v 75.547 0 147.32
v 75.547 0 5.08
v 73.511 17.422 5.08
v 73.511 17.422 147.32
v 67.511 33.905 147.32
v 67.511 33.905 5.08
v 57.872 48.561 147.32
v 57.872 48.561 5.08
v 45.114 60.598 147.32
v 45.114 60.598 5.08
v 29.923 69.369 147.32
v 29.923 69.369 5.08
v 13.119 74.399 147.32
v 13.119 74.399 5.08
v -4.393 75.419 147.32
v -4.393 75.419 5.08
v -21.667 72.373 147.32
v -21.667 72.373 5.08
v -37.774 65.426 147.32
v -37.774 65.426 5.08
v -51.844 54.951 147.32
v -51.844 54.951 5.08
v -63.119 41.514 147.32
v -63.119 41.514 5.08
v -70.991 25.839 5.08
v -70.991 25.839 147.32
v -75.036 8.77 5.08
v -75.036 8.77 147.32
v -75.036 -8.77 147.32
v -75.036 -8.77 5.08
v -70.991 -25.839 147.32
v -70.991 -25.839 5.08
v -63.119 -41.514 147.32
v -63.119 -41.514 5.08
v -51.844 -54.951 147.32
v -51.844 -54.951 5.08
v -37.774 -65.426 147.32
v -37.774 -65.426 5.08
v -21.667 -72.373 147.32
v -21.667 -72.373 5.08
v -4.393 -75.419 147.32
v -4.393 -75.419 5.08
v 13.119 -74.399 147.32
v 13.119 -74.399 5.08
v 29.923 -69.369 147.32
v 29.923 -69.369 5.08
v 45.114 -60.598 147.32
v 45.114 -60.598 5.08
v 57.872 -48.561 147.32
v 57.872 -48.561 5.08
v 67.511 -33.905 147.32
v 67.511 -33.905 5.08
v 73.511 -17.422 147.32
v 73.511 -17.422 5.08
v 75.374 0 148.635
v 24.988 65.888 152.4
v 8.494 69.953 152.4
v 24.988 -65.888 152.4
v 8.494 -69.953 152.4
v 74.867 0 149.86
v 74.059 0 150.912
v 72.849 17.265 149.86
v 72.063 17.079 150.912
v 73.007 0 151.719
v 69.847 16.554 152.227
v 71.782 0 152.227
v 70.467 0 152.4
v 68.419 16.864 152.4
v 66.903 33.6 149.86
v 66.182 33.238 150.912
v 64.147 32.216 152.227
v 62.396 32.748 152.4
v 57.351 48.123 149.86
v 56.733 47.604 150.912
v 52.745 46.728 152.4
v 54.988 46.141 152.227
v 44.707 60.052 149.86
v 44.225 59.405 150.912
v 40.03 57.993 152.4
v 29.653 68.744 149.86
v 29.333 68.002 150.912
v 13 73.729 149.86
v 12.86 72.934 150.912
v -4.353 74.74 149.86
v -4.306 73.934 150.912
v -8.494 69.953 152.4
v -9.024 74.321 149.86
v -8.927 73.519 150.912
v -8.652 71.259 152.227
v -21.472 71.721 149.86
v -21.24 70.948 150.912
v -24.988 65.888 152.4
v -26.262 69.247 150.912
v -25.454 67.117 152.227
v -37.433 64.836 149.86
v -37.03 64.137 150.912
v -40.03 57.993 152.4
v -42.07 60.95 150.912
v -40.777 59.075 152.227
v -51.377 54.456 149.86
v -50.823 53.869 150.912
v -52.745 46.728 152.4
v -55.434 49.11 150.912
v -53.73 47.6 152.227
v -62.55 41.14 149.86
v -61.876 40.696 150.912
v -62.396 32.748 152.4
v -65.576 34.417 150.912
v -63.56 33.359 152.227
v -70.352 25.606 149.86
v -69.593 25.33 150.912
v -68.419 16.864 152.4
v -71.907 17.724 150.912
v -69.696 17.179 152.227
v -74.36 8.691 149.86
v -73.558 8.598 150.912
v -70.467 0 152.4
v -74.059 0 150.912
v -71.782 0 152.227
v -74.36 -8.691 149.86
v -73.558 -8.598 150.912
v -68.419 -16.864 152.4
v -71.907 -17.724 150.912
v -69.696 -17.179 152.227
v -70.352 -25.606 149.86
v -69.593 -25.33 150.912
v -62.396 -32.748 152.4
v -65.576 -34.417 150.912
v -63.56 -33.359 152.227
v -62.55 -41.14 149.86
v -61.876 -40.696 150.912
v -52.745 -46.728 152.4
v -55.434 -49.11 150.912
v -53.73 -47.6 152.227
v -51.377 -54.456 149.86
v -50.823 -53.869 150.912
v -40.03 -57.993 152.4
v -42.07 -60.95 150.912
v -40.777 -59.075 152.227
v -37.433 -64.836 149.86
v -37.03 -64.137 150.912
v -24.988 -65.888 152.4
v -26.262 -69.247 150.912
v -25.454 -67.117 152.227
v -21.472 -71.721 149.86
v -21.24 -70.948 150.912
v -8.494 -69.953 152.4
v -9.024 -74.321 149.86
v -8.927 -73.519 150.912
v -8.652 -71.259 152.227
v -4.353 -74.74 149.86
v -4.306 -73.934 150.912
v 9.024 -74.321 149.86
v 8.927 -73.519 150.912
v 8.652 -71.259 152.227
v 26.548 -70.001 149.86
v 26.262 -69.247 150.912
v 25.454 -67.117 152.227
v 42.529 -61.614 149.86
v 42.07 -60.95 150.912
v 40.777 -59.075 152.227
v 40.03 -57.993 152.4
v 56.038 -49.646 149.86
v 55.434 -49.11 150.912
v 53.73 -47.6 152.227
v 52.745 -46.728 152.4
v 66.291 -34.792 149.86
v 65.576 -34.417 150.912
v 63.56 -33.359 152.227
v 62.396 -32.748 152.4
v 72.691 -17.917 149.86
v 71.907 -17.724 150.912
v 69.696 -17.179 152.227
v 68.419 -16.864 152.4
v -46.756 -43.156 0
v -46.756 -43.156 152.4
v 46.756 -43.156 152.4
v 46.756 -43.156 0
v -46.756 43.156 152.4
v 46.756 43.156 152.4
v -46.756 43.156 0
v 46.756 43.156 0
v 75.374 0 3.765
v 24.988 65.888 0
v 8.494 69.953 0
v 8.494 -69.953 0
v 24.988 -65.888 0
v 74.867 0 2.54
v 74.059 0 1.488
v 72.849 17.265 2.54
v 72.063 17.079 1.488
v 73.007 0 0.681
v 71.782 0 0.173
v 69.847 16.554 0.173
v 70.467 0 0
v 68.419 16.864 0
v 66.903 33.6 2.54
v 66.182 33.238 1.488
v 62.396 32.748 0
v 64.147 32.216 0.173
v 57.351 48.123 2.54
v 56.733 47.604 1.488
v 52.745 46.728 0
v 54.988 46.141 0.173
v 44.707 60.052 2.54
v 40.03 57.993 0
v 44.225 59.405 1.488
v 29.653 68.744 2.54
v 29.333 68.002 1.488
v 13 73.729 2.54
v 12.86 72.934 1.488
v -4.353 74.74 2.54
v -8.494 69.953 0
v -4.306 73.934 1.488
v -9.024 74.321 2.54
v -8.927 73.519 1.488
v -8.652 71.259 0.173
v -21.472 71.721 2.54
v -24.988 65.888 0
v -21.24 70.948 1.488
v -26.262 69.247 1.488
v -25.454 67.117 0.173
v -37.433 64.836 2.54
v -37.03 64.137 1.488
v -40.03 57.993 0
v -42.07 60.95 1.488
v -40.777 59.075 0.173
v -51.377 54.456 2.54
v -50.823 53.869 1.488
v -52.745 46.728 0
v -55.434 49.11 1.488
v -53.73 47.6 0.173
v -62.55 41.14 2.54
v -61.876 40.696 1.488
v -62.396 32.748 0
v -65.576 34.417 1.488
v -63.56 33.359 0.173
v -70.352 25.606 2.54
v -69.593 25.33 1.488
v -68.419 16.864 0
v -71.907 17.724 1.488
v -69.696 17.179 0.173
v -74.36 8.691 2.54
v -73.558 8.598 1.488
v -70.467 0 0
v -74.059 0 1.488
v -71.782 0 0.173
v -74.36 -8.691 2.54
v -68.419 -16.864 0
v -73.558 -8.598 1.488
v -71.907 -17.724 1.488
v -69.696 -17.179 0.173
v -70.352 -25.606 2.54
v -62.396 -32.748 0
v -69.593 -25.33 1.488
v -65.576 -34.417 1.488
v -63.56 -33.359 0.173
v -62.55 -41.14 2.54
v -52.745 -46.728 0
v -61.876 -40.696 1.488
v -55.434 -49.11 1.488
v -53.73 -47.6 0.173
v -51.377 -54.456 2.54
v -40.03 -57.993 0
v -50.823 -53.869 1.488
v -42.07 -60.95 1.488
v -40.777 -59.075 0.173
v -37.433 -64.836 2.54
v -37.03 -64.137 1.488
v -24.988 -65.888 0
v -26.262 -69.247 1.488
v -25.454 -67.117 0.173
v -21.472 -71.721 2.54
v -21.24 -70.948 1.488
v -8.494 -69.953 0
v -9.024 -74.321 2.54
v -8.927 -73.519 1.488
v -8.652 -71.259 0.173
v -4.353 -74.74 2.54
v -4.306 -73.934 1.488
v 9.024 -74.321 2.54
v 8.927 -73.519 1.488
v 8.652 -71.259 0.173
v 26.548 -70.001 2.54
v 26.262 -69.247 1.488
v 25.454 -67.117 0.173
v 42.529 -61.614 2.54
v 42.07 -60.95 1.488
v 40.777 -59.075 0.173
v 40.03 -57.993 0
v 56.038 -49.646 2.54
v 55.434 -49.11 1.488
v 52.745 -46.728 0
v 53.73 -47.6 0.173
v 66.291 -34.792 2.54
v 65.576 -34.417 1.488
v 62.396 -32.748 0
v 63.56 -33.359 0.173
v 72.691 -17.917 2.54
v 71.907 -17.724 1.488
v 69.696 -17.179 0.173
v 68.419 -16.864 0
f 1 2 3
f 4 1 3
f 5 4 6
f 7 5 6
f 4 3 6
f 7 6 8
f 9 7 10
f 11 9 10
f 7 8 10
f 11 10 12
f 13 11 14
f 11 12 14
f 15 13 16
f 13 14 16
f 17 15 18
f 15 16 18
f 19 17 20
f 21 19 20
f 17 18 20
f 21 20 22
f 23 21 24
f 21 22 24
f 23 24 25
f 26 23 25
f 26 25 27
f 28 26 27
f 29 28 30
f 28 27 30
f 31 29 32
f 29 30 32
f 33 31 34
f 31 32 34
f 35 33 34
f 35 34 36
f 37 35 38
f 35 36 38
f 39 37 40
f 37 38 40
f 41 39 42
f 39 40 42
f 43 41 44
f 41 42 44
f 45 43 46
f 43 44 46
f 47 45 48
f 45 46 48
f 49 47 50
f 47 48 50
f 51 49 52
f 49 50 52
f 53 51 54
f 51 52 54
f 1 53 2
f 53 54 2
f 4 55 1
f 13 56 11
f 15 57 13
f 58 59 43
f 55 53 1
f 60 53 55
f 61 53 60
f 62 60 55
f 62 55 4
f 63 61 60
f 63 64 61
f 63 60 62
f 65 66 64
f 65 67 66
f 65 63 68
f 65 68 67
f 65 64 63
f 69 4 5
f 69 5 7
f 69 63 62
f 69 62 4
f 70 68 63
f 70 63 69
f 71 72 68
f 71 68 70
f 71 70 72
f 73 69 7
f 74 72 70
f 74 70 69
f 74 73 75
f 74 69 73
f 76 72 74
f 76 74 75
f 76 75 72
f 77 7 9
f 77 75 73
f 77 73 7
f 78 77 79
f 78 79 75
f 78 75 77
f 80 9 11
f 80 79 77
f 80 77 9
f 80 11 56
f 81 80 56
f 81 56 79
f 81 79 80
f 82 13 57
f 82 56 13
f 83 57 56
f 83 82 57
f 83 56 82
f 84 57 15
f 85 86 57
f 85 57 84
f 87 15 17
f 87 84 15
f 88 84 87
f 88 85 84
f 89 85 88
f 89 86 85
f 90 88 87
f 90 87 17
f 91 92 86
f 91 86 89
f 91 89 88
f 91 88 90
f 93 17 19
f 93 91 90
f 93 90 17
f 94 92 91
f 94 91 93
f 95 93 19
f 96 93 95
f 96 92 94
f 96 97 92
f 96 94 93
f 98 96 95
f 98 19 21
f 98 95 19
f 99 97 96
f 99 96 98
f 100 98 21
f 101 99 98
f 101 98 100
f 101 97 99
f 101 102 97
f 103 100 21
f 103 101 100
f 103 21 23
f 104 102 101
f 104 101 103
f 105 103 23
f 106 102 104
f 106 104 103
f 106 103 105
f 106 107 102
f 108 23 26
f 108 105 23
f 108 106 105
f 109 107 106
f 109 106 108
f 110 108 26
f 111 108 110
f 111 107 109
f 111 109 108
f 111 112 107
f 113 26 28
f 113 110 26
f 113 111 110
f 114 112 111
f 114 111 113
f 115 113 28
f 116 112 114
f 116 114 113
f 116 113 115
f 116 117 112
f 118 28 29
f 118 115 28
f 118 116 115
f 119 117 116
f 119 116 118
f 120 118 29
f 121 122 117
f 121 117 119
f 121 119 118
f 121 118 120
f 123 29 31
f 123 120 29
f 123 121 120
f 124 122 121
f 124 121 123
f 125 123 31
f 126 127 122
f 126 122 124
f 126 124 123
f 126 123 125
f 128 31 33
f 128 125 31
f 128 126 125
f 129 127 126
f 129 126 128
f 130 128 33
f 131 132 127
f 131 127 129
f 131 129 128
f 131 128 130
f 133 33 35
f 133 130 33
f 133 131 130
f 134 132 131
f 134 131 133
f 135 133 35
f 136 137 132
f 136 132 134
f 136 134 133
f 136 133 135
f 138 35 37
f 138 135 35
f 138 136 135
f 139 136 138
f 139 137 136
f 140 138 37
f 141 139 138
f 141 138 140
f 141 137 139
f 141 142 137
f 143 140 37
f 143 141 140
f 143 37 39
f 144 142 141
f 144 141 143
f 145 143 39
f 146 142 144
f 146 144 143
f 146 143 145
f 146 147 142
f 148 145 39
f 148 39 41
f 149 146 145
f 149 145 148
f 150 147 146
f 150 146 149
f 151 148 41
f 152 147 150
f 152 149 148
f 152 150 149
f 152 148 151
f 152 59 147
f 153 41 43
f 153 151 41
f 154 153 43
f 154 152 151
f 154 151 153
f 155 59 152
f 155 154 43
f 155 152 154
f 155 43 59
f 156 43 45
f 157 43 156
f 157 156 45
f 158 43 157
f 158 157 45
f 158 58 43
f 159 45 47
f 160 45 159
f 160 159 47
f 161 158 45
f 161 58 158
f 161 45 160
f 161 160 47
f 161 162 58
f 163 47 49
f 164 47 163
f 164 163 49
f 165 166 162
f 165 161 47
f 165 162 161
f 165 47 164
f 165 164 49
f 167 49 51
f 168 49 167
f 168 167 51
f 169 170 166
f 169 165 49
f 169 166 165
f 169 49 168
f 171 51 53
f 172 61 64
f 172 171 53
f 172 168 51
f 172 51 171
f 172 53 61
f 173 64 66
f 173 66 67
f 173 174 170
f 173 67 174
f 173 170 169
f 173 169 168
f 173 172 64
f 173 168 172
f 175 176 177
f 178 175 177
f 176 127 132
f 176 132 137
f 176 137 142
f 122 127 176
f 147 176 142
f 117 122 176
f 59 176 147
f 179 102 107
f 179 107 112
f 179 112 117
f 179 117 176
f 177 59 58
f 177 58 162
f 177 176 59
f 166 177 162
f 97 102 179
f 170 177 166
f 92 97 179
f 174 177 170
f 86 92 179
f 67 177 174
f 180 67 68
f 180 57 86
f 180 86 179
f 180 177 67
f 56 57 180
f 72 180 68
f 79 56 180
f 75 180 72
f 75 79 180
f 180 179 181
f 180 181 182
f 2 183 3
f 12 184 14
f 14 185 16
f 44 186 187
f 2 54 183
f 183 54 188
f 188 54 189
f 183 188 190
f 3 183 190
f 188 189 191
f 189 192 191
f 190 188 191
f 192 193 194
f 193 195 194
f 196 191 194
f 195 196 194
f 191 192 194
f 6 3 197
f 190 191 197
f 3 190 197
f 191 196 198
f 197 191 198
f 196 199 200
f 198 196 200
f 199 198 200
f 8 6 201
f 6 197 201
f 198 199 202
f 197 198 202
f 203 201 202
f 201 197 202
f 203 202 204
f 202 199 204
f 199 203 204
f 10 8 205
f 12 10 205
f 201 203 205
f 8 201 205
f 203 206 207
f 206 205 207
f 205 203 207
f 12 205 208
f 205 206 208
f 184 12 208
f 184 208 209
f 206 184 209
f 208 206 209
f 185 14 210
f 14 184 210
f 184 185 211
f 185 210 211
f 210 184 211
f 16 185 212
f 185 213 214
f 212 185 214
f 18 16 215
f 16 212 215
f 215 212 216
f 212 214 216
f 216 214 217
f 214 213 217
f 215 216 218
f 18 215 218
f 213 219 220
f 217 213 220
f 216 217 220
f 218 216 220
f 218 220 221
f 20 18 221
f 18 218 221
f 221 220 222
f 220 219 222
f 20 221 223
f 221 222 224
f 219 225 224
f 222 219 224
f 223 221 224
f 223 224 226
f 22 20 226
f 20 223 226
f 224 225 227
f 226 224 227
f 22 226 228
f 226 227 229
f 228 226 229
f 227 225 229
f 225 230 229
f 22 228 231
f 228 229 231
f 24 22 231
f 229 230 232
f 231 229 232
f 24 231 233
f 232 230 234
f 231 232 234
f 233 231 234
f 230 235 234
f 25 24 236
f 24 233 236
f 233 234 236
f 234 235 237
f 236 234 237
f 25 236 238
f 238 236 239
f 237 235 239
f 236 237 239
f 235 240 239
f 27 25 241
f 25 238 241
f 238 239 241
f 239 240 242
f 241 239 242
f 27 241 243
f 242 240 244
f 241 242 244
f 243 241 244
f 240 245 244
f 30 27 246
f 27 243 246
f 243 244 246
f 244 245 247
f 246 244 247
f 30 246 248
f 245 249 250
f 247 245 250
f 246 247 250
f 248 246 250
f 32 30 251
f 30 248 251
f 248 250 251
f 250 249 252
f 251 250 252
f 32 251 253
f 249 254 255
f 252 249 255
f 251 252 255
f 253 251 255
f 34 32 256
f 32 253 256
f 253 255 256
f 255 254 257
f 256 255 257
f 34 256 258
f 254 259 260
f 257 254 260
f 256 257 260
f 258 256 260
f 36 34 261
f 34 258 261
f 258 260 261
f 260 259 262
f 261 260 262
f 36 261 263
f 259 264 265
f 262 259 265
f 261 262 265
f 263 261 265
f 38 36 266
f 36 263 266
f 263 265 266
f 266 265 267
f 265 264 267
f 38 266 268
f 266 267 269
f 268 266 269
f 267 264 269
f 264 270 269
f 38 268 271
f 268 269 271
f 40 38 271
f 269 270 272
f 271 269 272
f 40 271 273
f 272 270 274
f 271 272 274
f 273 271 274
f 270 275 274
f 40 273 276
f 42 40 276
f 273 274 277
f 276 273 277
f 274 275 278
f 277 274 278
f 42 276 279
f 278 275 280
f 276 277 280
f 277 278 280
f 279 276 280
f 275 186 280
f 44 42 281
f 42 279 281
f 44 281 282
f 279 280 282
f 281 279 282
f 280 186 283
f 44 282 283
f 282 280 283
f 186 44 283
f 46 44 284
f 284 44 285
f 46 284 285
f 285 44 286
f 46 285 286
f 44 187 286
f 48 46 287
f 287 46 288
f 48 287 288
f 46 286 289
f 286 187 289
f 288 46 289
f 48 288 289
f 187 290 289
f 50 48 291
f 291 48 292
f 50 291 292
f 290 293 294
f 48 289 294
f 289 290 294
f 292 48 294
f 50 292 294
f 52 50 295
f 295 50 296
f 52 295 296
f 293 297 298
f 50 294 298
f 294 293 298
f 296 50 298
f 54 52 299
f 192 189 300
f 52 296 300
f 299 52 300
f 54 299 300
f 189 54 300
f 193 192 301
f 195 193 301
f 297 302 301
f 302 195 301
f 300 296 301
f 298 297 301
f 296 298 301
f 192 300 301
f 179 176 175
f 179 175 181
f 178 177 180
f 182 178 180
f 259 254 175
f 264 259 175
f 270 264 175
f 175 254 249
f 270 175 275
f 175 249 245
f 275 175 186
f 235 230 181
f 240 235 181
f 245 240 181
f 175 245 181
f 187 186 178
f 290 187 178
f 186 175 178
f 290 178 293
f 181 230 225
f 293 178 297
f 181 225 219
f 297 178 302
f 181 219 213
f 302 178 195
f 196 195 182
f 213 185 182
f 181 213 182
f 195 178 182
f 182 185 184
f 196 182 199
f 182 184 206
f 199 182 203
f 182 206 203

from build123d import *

# Parameters (mm, degrees)
F0_R     = 75.547146
F1_DEPTH = 152.4
F2_R     = 5.08
F3_W     = 93.511396
F3_H     = 86.312428
F4_DEPTH = 152.4
F5_R     = 5.08


with BuildPart() as f1:
    # F0 (on Top) → F1 (new body)
    with BuildSketch(Plane.XY):
        Circle(F0_R)
    extrude(amount=F1_DEPTH)

    # F2
    f2_edges = [f1.edges().sort_by_distance(p)[0] for p in [
        (-75.547146, 0, 152.4),
    ]]
    fillet(f2_edges, radius=F2_R)

    # F3 (on face) → F4 (cut)
    with BuildSketch(Plane.XY.offset(152.4)):
        Rectangle(F3_W, F3_H)
    extrude(amount=-F4_DEPTH, mode=Mode.SUBTRACT)

    # F5
    f5_edges = [f1.edges().sort_by_distance(p)[0] for p in [
        (-75.547146, 0, 0),
    ]]
    fillet(f5_edges, radius=F5_R)


solid = f1.part
